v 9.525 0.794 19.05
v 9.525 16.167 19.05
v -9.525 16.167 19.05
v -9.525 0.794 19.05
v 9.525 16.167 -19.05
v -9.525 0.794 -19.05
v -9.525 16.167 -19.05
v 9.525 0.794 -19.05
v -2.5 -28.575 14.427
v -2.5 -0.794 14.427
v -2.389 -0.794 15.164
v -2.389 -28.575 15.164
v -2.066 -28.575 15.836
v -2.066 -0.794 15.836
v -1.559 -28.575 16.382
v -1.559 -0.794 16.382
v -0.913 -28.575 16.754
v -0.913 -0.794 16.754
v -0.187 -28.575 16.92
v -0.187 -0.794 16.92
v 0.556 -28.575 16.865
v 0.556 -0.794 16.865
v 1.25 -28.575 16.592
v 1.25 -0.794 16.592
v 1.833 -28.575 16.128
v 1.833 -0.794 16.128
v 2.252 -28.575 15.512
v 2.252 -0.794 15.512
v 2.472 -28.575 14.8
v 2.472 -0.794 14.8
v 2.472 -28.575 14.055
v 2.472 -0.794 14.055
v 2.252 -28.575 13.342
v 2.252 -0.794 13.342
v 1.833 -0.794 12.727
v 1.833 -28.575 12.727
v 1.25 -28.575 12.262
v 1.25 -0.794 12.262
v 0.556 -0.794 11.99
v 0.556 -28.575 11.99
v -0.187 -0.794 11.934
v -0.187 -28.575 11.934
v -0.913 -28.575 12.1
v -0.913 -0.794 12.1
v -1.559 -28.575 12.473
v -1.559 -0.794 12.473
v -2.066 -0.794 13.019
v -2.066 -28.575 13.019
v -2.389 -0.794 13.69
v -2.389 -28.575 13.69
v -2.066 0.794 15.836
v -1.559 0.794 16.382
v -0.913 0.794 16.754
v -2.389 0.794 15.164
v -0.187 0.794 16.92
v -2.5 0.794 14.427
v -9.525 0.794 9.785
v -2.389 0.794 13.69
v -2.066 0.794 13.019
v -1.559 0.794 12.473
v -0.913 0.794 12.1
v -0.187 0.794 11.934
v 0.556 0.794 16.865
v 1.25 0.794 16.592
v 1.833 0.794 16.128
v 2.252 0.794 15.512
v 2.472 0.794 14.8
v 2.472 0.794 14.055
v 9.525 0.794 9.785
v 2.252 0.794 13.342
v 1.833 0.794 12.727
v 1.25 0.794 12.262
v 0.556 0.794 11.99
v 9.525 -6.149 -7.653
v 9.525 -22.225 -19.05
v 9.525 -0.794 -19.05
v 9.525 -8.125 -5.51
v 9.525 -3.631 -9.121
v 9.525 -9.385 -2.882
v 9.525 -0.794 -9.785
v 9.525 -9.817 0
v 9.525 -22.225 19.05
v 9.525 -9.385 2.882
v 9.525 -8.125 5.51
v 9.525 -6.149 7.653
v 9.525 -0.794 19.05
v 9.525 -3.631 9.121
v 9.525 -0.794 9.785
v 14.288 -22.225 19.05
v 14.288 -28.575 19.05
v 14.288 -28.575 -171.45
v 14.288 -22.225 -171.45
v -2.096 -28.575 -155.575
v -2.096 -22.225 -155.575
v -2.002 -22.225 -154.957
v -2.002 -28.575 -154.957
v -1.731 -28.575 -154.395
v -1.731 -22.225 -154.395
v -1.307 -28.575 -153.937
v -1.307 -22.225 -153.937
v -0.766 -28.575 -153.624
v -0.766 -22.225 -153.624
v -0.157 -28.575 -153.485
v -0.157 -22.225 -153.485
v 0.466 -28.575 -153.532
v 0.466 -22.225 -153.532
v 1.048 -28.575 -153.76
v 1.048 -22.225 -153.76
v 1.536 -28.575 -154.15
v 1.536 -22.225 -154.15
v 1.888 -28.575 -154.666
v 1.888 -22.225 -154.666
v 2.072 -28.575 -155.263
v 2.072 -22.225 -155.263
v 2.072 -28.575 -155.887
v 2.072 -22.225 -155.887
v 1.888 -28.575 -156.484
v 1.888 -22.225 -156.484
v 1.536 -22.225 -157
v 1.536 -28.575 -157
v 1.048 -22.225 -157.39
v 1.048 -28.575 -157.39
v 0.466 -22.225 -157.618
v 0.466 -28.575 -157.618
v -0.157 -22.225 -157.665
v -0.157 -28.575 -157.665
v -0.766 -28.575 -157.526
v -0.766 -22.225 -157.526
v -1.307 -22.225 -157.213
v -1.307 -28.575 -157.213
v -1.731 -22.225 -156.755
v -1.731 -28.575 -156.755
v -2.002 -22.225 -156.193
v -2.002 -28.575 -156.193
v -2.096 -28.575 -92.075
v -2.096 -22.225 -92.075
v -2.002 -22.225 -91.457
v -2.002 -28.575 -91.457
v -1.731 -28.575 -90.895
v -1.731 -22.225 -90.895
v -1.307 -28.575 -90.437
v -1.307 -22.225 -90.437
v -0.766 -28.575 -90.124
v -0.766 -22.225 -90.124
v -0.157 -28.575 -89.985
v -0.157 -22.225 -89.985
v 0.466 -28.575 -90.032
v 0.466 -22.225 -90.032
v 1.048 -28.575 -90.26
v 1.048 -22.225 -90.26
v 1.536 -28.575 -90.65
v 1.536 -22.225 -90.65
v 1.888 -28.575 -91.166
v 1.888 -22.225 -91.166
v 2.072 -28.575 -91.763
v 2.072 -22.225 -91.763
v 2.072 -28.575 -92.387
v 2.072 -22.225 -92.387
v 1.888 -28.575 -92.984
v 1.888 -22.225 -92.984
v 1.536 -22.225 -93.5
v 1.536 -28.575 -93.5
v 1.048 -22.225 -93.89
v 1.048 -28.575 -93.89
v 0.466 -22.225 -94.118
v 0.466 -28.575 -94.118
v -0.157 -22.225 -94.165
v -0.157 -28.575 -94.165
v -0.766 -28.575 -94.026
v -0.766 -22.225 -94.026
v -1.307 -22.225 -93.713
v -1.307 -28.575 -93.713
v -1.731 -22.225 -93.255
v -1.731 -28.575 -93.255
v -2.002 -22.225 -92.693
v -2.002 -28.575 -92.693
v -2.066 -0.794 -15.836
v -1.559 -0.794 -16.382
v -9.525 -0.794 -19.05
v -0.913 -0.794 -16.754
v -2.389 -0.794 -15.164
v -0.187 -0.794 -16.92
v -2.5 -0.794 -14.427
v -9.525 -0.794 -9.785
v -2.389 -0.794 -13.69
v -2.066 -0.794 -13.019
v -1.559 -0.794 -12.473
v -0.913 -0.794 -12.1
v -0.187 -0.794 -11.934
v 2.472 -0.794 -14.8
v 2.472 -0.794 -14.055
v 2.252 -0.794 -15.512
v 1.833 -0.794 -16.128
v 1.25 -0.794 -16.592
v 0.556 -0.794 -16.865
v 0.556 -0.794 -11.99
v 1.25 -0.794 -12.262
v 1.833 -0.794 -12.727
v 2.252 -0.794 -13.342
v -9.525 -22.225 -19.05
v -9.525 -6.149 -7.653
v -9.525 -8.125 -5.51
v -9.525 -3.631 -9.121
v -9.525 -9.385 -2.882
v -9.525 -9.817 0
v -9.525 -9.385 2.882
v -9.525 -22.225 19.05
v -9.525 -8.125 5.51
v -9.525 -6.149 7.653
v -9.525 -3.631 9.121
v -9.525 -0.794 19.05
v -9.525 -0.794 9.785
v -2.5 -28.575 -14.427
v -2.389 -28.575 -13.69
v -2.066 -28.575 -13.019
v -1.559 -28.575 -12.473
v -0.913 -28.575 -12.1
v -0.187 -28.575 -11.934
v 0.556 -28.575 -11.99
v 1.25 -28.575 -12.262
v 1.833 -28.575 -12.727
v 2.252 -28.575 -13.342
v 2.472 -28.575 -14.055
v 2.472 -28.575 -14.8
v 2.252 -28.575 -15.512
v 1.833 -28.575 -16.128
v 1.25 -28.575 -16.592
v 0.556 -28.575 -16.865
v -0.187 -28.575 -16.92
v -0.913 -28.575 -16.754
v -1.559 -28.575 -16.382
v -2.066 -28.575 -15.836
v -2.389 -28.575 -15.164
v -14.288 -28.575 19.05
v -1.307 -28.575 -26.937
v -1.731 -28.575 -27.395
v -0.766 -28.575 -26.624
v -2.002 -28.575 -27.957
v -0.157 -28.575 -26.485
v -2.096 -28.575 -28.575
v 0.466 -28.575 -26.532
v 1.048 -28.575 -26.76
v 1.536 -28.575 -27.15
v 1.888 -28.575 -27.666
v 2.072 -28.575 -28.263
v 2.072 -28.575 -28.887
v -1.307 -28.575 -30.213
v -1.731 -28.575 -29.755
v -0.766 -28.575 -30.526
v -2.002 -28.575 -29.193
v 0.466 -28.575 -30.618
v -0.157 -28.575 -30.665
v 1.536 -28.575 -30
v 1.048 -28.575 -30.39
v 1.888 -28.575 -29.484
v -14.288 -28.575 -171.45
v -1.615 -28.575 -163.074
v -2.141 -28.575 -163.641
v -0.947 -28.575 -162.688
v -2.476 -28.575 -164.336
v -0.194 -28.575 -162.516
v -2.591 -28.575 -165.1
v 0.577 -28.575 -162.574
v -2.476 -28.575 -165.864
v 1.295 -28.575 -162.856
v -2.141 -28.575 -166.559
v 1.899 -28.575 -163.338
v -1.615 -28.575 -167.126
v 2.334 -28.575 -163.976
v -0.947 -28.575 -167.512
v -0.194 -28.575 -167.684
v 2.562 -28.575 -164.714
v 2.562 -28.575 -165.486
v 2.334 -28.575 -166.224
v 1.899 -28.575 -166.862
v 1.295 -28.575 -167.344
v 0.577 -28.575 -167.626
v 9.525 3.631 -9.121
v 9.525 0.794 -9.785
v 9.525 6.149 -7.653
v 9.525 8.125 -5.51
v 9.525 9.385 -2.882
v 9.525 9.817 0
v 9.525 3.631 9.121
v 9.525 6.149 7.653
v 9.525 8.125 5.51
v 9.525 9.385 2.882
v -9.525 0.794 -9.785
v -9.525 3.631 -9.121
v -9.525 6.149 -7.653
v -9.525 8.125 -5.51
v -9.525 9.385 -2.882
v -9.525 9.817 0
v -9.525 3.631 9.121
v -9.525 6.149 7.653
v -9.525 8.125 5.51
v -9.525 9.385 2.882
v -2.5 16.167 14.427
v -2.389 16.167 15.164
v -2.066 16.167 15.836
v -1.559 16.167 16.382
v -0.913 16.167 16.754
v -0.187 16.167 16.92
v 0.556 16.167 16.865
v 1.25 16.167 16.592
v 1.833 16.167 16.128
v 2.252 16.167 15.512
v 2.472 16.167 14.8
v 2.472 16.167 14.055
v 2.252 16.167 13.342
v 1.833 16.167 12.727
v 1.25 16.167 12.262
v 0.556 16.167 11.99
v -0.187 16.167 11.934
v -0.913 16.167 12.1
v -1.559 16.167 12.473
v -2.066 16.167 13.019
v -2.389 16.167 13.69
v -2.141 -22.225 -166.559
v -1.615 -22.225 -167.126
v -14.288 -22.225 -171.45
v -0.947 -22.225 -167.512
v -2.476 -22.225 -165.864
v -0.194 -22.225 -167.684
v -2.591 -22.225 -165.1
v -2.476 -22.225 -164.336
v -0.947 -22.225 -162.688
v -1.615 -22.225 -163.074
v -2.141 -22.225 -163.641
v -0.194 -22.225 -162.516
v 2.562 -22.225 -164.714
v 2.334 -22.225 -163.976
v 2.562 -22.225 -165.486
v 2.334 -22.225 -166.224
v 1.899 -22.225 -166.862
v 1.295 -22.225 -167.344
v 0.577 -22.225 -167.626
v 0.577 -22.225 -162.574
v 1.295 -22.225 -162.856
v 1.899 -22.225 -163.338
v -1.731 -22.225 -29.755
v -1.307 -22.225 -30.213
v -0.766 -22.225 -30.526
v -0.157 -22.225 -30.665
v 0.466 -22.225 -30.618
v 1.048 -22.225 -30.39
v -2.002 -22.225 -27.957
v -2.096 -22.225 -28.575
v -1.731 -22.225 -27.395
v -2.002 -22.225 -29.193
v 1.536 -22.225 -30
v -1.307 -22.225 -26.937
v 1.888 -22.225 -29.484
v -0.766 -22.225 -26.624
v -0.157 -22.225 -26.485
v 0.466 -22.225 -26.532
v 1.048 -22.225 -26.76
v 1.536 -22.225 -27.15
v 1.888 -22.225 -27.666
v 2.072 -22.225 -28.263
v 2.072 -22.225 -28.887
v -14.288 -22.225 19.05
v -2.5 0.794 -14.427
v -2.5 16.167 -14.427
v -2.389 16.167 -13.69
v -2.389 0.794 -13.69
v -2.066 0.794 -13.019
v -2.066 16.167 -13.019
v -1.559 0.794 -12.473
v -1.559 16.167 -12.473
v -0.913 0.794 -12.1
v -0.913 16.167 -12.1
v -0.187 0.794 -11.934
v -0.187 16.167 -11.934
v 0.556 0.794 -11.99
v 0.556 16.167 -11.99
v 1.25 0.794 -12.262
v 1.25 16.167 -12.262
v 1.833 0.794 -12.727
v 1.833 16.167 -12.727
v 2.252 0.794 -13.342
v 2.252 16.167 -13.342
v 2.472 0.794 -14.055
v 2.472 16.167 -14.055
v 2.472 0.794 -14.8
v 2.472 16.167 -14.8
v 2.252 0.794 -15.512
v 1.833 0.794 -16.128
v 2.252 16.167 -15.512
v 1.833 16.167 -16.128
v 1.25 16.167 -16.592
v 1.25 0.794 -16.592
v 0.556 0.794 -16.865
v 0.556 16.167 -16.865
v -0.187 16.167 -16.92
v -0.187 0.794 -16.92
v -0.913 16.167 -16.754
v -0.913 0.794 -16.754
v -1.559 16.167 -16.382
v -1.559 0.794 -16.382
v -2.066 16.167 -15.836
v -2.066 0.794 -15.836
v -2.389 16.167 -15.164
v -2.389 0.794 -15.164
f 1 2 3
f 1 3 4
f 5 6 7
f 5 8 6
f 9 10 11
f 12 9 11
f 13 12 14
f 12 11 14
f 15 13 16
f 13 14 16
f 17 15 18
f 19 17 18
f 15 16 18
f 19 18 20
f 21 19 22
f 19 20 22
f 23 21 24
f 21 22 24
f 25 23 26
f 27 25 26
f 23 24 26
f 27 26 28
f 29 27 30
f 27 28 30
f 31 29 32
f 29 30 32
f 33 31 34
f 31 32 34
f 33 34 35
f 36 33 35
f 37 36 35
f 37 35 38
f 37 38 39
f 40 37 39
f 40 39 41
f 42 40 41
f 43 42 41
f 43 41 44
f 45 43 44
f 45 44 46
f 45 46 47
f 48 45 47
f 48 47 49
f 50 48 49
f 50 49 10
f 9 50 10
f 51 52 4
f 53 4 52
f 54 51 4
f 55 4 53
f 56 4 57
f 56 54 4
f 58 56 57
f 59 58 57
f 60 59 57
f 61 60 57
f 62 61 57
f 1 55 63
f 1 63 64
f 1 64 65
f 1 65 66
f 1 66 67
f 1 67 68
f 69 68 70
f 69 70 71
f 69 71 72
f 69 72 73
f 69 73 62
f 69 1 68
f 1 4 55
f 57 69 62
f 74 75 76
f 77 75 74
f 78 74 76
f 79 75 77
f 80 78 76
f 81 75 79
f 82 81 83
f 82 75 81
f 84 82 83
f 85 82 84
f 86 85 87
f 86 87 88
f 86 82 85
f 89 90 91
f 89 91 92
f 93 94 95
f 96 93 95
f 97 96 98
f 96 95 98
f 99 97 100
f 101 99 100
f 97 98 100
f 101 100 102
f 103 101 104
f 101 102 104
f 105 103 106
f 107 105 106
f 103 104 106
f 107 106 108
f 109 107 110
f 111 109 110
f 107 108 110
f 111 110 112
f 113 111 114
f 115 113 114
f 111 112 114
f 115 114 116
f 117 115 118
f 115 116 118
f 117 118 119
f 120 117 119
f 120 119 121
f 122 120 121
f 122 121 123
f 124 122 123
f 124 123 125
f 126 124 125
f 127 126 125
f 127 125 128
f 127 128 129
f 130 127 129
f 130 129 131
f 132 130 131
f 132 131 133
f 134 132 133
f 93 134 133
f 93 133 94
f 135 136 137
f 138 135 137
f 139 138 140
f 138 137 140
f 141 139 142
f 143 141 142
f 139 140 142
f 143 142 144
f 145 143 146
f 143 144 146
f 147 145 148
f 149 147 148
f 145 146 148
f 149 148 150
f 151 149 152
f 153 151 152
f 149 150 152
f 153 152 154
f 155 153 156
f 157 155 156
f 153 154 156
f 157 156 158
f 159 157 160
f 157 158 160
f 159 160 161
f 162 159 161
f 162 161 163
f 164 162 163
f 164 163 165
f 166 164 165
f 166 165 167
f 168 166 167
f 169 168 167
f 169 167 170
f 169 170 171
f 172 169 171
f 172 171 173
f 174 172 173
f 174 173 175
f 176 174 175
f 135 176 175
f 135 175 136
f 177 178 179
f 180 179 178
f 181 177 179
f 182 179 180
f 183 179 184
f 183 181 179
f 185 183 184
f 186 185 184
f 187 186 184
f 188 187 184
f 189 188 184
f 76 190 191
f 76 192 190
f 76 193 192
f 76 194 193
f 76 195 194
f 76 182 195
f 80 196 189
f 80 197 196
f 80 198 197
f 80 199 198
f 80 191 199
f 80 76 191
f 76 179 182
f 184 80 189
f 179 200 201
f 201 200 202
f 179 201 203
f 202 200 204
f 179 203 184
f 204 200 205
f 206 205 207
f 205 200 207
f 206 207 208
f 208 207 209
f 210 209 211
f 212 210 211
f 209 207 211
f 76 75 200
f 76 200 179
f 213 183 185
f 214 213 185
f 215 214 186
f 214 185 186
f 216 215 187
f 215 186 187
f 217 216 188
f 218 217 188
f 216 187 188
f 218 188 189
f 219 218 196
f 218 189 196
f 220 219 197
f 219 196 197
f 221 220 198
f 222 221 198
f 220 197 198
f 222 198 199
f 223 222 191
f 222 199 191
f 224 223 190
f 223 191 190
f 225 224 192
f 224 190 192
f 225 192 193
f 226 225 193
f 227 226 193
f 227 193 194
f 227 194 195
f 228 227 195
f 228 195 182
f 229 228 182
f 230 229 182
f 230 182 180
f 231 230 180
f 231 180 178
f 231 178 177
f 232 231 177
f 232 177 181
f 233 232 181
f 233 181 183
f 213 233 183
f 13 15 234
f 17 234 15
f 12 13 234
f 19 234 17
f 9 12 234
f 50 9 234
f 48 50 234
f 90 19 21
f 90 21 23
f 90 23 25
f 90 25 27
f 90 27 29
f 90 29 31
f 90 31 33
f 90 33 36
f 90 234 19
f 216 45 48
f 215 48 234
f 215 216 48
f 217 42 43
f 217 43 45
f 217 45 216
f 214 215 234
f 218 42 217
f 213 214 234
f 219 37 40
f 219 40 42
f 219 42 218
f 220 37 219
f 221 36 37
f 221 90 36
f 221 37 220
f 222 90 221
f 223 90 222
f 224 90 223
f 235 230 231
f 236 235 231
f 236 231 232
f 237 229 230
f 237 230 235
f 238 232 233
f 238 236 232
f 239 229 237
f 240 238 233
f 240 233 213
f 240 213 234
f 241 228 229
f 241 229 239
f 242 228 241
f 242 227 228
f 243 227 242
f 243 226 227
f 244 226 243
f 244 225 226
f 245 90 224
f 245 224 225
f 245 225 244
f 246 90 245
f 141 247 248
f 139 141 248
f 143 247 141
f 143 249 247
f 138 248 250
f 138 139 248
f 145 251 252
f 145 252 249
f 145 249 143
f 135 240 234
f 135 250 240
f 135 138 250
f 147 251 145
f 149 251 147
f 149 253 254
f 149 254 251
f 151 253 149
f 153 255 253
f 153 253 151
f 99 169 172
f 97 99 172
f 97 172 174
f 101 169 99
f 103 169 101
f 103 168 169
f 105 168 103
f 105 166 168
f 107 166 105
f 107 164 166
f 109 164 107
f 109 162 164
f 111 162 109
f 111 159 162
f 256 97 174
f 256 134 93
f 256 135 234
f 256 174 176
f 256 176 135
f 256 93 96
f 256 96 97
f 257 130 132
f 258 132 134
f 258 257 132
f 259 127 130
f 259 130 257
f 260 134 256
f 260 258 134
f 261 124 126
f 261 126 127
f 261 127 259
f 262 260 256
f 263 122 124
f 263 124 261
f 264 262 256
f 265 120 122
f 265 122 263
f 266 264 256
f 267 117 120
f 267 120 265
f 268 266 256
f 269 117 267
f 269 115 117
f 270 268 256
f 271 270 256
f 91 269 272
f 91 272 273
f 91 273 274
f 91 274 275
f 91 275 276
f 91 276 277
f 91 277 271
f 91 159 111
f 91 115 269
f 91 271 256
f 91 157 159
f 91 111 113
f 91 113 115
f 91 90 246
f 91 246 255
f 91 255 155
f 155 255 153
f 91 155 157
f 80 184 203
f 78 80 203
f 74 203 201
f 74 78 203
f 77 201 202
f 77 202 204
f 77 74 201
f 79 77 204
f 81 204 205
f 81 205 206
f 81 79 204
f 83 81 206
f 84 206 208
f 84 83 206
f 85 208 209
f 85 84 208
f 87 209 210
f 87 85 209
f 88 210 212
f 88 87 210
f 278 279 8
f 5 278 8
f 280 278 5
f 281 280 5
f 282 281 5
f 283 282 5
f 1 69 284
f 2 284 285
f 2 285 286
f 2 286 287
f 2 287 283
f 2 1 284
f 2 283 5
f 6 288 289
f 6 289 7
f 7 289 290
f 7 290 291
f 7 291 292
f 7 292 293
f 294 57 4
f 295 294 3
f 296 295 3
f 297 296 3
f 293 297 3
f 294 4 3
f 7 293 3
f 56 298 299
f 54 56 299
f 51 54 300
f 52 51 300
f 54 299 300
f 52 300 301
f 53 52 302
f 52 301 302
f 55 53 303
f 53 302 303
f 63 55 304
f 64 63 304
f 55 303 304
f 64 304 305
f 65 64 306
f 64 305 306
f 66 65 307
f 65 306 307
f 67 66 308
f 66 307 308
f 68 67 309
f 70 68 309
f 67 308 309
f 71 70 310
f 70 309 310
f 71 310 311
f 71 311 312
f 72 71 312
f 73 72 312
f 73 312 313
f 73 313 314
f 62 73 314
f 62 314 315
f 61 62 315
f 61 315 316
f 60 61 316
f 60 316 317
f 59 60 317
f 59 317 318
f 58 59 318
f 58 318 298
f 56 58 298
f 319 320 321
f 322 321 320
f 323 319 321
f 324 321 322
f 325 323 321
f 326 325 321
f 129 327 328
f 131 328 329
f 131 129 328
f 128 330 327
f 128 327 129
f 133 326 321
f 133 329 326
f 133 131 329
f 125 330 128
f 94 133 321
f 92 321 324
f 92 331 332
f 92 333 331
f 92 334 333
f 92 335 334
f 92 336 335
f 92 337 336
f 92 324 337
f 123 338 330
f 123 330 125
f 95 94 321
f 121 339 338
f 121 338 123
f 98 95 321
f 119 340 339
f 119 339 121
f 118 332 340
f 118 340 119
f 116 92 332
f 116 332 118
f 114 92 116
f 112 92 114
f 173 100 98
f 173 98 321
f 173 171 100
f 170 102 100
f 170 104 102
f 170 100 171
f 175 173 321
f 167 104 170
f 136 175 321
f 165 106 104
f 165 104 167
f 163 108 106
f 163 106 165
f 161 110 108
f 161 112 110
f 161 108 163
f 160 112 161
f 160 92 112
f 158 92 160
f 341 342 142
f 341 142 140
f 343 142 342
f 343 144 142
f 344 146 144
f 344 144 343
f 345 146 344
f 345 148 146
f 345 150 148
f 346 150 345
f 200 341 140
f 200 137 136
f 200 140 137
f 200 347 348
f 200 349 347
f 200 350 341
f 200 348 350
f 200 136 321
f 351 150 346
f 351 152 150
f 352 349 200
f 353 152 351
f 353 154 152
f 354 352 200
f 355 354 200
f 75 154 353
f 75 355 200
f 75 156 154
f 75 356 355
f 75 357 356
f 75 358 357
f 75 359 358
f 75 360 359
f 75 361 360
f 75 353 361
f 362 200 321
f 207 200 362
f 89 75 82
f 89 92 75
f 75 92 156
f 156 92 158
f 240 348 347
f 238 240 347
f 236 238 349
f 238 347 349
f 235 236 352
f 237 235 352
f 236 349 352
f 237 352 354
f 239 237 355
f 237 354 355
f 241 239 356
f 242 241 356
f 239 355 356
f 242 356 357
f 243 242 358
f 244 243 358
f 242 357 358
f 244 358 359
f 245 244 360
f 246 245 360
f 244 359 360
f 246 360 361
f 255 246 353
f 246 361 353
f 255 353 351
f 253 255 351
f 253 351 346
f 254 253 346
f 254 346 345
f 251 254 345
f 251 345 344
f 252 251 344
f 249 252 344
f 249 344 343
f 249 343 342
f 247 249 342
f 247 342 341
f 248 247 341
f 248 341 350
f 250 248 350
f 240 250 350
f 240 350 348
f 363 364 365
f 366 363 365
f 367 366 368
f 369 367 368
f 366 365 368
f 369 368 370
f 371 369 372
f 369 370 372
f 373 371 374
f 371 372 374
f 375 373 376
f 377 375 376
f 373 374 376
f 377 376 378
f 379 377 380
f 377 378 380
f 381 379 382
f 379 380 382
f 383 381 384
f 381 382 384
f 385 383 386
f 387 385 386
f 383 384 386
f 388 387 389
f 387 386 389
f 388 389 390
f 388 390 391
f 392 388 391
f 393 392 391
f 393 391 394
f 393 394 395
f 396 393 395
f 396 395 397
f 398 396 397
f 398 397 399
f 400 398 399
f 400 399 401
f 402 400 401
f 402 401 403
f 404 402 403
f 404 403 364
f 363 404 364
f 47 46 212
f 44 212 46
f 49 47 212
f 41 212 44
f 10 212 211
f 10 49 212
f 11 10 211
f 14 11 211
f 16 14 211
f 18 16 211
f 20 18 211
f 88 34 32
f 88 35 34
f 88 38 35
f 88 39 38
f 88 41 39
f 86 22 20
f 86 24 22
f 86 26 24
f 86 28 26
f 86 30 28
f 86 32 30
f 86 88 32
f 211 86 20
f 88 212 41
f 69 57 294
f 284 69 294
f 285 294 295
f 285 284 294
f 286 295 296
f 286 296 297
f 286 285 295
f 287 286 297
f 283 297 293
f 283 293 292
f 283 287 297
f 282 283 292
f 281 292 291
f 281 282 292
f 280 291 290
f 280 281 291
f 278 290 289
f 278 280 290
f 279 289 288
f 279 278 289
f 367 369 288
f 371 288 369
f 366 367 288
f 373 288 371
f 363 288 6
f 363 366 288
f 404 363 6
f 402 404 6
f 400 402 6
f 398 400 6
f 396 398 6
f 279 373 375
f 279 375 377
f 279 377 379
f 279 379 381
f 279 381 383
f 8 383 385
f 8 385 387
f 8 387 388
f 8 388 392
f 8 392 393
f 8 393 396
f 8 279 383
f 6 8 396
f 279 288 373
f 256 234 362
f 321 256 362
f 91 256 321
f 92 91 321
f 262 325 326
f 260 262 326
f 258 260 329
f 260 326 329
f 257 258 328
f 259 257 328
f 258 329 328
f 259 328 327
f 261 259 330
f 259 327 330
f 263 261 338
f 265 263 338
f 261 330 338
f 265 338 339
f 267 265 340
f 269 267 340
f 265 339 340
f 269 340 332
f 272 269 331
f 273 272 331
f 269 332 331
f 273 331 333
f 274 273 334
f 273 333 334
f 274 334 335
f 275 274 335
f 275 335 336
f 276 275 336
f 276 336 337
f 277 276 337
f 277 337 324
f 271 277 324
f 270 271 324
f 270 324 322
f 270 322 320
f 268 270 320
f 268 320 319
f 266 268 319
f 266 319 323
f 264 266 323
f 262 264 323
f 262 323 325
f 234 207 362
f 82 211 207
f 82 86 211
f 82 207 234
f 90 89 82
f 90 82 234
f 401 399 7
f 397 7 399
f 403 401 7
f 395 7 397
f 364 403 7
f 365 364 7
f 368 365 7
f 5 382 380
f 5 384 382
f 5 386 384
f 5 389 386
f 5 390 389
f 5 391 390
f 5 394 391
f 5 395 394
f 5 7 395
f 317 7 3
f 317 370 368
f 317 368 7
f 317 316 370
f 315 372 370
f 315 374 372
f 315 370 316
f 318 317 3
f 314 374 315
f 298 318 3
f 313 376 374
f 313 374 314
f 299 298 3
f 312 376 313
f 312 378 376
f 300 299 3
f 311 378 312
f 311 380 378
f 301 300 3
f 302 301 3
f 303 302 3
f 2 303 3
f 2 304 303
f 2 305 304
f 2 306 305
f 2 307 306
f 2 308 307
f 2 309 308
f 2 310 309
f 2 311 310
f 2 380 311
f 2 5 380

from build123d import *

# Parameters (mm, degrees)
F1_DEPTH       = 14.2875
F1_DEPTH_BACK  = 14.2875
F3_DEPTH       = 9.525
F3_DEPTH_BACK  = 9.525
F4_D           = 5
F4_DEPTH       = 76.2
F4_CBORE_D     = 11.25
F4_CBORE_DEPTH = 0
F5_D           = 4.191
F5_DEPTH       = 76.2
F5_CBORE_D     = 11.25
F5_CBORE_DEPTH = 0
F6_D           = 5.1816
F6_DEPTH       = 76.2
F6_CBORE_D     = 11.25
F6_CBORE_DEPTH = 0


with BuildPart() as f1:
    # F0 (on Right) → F1 (new body, two sides)
    with BuildSketch(Plane.YZ) as f1_sk:
        Polygon((-22.225, 19.05), (-28.575, 19.05), (-28.575, -171.45), (-22.225, -171.45), (-22.225, -19.05), align=None)
    extrude(amount=F1_DEPTH)
    extrude(f1_sk.sketch, amount=-F1_DEPTH_BACK)

    # F0 (on Right) → F3 (join, two sides)
    with BuildSketch(Plane.YZ) as f3_sk:
        with BuildLine():
            Line((-0.79375, 19.05), (-22.225, 19.05))
            Line((-22.225, 19.05), (-22.225, -19.05))
            Line((-22.225, -19.05), (-0.79375, -19.05))
            Line((-0.79375, -19.05), (-0.79375, -9.784959))
            ThreePointArc((-0.79375, -9.784959), (-9.8171, 0), (-0.79375, 9.784959))
            Line((-0.79375, 9.784959), (-0.79375, 19.05))
        make_face()
        with BuildLine():
            Line((16.1671, -19.05), (16.1671, 19.05))
            Line((16.1671, 19.05), (0.79375, 19.05))
            Line((0.79375, 19.05), (0.79375, 9.784959))
            ThreePointArc((0.79375, 9.784959), (9.8171, 0), (0.79375, -9.784959))
            Line((0.79375, -9.784959), (0.79375, -19.05))
            Line((0.79375, -19.05), (16.1671, -19.05))
        make_face()
    extrude(amount=F3_DEPTH)
    extrude(f3_sk.sketch, amount=-F3_DEPTH_BACK)

    # F4
    with Locations(Plane.XZ.offset(28.575)):
        with Locations((0, 14.4272), (0, -14.4272)):
            CounterBoreHole(F4_D / 2, F4_CBORE_D / 2, F4_CBORE_DEPTH, depth=F4_DEPTH)

    # F5
    with Locations(Plane.XZ.offset(28.575)):
        with Locations((0, -28.575), (0, -92.075), (0, -155.575)):
            CounterBoreHole(F5_D / 2, F5_CBORE_D / 2, F5_CBORE_DEPTH, depth=F5_DEPTH)

    # F6
    with Locations(Plane.XZ.offset(28.575)):
        with Locations((0, -165.1)):
            CounterBoreHole(F6_D / 2, F6_CBORE_D / 2, F6_CBORE_DEPTH, depth=F6_DEPTH)


solid = f1.part
